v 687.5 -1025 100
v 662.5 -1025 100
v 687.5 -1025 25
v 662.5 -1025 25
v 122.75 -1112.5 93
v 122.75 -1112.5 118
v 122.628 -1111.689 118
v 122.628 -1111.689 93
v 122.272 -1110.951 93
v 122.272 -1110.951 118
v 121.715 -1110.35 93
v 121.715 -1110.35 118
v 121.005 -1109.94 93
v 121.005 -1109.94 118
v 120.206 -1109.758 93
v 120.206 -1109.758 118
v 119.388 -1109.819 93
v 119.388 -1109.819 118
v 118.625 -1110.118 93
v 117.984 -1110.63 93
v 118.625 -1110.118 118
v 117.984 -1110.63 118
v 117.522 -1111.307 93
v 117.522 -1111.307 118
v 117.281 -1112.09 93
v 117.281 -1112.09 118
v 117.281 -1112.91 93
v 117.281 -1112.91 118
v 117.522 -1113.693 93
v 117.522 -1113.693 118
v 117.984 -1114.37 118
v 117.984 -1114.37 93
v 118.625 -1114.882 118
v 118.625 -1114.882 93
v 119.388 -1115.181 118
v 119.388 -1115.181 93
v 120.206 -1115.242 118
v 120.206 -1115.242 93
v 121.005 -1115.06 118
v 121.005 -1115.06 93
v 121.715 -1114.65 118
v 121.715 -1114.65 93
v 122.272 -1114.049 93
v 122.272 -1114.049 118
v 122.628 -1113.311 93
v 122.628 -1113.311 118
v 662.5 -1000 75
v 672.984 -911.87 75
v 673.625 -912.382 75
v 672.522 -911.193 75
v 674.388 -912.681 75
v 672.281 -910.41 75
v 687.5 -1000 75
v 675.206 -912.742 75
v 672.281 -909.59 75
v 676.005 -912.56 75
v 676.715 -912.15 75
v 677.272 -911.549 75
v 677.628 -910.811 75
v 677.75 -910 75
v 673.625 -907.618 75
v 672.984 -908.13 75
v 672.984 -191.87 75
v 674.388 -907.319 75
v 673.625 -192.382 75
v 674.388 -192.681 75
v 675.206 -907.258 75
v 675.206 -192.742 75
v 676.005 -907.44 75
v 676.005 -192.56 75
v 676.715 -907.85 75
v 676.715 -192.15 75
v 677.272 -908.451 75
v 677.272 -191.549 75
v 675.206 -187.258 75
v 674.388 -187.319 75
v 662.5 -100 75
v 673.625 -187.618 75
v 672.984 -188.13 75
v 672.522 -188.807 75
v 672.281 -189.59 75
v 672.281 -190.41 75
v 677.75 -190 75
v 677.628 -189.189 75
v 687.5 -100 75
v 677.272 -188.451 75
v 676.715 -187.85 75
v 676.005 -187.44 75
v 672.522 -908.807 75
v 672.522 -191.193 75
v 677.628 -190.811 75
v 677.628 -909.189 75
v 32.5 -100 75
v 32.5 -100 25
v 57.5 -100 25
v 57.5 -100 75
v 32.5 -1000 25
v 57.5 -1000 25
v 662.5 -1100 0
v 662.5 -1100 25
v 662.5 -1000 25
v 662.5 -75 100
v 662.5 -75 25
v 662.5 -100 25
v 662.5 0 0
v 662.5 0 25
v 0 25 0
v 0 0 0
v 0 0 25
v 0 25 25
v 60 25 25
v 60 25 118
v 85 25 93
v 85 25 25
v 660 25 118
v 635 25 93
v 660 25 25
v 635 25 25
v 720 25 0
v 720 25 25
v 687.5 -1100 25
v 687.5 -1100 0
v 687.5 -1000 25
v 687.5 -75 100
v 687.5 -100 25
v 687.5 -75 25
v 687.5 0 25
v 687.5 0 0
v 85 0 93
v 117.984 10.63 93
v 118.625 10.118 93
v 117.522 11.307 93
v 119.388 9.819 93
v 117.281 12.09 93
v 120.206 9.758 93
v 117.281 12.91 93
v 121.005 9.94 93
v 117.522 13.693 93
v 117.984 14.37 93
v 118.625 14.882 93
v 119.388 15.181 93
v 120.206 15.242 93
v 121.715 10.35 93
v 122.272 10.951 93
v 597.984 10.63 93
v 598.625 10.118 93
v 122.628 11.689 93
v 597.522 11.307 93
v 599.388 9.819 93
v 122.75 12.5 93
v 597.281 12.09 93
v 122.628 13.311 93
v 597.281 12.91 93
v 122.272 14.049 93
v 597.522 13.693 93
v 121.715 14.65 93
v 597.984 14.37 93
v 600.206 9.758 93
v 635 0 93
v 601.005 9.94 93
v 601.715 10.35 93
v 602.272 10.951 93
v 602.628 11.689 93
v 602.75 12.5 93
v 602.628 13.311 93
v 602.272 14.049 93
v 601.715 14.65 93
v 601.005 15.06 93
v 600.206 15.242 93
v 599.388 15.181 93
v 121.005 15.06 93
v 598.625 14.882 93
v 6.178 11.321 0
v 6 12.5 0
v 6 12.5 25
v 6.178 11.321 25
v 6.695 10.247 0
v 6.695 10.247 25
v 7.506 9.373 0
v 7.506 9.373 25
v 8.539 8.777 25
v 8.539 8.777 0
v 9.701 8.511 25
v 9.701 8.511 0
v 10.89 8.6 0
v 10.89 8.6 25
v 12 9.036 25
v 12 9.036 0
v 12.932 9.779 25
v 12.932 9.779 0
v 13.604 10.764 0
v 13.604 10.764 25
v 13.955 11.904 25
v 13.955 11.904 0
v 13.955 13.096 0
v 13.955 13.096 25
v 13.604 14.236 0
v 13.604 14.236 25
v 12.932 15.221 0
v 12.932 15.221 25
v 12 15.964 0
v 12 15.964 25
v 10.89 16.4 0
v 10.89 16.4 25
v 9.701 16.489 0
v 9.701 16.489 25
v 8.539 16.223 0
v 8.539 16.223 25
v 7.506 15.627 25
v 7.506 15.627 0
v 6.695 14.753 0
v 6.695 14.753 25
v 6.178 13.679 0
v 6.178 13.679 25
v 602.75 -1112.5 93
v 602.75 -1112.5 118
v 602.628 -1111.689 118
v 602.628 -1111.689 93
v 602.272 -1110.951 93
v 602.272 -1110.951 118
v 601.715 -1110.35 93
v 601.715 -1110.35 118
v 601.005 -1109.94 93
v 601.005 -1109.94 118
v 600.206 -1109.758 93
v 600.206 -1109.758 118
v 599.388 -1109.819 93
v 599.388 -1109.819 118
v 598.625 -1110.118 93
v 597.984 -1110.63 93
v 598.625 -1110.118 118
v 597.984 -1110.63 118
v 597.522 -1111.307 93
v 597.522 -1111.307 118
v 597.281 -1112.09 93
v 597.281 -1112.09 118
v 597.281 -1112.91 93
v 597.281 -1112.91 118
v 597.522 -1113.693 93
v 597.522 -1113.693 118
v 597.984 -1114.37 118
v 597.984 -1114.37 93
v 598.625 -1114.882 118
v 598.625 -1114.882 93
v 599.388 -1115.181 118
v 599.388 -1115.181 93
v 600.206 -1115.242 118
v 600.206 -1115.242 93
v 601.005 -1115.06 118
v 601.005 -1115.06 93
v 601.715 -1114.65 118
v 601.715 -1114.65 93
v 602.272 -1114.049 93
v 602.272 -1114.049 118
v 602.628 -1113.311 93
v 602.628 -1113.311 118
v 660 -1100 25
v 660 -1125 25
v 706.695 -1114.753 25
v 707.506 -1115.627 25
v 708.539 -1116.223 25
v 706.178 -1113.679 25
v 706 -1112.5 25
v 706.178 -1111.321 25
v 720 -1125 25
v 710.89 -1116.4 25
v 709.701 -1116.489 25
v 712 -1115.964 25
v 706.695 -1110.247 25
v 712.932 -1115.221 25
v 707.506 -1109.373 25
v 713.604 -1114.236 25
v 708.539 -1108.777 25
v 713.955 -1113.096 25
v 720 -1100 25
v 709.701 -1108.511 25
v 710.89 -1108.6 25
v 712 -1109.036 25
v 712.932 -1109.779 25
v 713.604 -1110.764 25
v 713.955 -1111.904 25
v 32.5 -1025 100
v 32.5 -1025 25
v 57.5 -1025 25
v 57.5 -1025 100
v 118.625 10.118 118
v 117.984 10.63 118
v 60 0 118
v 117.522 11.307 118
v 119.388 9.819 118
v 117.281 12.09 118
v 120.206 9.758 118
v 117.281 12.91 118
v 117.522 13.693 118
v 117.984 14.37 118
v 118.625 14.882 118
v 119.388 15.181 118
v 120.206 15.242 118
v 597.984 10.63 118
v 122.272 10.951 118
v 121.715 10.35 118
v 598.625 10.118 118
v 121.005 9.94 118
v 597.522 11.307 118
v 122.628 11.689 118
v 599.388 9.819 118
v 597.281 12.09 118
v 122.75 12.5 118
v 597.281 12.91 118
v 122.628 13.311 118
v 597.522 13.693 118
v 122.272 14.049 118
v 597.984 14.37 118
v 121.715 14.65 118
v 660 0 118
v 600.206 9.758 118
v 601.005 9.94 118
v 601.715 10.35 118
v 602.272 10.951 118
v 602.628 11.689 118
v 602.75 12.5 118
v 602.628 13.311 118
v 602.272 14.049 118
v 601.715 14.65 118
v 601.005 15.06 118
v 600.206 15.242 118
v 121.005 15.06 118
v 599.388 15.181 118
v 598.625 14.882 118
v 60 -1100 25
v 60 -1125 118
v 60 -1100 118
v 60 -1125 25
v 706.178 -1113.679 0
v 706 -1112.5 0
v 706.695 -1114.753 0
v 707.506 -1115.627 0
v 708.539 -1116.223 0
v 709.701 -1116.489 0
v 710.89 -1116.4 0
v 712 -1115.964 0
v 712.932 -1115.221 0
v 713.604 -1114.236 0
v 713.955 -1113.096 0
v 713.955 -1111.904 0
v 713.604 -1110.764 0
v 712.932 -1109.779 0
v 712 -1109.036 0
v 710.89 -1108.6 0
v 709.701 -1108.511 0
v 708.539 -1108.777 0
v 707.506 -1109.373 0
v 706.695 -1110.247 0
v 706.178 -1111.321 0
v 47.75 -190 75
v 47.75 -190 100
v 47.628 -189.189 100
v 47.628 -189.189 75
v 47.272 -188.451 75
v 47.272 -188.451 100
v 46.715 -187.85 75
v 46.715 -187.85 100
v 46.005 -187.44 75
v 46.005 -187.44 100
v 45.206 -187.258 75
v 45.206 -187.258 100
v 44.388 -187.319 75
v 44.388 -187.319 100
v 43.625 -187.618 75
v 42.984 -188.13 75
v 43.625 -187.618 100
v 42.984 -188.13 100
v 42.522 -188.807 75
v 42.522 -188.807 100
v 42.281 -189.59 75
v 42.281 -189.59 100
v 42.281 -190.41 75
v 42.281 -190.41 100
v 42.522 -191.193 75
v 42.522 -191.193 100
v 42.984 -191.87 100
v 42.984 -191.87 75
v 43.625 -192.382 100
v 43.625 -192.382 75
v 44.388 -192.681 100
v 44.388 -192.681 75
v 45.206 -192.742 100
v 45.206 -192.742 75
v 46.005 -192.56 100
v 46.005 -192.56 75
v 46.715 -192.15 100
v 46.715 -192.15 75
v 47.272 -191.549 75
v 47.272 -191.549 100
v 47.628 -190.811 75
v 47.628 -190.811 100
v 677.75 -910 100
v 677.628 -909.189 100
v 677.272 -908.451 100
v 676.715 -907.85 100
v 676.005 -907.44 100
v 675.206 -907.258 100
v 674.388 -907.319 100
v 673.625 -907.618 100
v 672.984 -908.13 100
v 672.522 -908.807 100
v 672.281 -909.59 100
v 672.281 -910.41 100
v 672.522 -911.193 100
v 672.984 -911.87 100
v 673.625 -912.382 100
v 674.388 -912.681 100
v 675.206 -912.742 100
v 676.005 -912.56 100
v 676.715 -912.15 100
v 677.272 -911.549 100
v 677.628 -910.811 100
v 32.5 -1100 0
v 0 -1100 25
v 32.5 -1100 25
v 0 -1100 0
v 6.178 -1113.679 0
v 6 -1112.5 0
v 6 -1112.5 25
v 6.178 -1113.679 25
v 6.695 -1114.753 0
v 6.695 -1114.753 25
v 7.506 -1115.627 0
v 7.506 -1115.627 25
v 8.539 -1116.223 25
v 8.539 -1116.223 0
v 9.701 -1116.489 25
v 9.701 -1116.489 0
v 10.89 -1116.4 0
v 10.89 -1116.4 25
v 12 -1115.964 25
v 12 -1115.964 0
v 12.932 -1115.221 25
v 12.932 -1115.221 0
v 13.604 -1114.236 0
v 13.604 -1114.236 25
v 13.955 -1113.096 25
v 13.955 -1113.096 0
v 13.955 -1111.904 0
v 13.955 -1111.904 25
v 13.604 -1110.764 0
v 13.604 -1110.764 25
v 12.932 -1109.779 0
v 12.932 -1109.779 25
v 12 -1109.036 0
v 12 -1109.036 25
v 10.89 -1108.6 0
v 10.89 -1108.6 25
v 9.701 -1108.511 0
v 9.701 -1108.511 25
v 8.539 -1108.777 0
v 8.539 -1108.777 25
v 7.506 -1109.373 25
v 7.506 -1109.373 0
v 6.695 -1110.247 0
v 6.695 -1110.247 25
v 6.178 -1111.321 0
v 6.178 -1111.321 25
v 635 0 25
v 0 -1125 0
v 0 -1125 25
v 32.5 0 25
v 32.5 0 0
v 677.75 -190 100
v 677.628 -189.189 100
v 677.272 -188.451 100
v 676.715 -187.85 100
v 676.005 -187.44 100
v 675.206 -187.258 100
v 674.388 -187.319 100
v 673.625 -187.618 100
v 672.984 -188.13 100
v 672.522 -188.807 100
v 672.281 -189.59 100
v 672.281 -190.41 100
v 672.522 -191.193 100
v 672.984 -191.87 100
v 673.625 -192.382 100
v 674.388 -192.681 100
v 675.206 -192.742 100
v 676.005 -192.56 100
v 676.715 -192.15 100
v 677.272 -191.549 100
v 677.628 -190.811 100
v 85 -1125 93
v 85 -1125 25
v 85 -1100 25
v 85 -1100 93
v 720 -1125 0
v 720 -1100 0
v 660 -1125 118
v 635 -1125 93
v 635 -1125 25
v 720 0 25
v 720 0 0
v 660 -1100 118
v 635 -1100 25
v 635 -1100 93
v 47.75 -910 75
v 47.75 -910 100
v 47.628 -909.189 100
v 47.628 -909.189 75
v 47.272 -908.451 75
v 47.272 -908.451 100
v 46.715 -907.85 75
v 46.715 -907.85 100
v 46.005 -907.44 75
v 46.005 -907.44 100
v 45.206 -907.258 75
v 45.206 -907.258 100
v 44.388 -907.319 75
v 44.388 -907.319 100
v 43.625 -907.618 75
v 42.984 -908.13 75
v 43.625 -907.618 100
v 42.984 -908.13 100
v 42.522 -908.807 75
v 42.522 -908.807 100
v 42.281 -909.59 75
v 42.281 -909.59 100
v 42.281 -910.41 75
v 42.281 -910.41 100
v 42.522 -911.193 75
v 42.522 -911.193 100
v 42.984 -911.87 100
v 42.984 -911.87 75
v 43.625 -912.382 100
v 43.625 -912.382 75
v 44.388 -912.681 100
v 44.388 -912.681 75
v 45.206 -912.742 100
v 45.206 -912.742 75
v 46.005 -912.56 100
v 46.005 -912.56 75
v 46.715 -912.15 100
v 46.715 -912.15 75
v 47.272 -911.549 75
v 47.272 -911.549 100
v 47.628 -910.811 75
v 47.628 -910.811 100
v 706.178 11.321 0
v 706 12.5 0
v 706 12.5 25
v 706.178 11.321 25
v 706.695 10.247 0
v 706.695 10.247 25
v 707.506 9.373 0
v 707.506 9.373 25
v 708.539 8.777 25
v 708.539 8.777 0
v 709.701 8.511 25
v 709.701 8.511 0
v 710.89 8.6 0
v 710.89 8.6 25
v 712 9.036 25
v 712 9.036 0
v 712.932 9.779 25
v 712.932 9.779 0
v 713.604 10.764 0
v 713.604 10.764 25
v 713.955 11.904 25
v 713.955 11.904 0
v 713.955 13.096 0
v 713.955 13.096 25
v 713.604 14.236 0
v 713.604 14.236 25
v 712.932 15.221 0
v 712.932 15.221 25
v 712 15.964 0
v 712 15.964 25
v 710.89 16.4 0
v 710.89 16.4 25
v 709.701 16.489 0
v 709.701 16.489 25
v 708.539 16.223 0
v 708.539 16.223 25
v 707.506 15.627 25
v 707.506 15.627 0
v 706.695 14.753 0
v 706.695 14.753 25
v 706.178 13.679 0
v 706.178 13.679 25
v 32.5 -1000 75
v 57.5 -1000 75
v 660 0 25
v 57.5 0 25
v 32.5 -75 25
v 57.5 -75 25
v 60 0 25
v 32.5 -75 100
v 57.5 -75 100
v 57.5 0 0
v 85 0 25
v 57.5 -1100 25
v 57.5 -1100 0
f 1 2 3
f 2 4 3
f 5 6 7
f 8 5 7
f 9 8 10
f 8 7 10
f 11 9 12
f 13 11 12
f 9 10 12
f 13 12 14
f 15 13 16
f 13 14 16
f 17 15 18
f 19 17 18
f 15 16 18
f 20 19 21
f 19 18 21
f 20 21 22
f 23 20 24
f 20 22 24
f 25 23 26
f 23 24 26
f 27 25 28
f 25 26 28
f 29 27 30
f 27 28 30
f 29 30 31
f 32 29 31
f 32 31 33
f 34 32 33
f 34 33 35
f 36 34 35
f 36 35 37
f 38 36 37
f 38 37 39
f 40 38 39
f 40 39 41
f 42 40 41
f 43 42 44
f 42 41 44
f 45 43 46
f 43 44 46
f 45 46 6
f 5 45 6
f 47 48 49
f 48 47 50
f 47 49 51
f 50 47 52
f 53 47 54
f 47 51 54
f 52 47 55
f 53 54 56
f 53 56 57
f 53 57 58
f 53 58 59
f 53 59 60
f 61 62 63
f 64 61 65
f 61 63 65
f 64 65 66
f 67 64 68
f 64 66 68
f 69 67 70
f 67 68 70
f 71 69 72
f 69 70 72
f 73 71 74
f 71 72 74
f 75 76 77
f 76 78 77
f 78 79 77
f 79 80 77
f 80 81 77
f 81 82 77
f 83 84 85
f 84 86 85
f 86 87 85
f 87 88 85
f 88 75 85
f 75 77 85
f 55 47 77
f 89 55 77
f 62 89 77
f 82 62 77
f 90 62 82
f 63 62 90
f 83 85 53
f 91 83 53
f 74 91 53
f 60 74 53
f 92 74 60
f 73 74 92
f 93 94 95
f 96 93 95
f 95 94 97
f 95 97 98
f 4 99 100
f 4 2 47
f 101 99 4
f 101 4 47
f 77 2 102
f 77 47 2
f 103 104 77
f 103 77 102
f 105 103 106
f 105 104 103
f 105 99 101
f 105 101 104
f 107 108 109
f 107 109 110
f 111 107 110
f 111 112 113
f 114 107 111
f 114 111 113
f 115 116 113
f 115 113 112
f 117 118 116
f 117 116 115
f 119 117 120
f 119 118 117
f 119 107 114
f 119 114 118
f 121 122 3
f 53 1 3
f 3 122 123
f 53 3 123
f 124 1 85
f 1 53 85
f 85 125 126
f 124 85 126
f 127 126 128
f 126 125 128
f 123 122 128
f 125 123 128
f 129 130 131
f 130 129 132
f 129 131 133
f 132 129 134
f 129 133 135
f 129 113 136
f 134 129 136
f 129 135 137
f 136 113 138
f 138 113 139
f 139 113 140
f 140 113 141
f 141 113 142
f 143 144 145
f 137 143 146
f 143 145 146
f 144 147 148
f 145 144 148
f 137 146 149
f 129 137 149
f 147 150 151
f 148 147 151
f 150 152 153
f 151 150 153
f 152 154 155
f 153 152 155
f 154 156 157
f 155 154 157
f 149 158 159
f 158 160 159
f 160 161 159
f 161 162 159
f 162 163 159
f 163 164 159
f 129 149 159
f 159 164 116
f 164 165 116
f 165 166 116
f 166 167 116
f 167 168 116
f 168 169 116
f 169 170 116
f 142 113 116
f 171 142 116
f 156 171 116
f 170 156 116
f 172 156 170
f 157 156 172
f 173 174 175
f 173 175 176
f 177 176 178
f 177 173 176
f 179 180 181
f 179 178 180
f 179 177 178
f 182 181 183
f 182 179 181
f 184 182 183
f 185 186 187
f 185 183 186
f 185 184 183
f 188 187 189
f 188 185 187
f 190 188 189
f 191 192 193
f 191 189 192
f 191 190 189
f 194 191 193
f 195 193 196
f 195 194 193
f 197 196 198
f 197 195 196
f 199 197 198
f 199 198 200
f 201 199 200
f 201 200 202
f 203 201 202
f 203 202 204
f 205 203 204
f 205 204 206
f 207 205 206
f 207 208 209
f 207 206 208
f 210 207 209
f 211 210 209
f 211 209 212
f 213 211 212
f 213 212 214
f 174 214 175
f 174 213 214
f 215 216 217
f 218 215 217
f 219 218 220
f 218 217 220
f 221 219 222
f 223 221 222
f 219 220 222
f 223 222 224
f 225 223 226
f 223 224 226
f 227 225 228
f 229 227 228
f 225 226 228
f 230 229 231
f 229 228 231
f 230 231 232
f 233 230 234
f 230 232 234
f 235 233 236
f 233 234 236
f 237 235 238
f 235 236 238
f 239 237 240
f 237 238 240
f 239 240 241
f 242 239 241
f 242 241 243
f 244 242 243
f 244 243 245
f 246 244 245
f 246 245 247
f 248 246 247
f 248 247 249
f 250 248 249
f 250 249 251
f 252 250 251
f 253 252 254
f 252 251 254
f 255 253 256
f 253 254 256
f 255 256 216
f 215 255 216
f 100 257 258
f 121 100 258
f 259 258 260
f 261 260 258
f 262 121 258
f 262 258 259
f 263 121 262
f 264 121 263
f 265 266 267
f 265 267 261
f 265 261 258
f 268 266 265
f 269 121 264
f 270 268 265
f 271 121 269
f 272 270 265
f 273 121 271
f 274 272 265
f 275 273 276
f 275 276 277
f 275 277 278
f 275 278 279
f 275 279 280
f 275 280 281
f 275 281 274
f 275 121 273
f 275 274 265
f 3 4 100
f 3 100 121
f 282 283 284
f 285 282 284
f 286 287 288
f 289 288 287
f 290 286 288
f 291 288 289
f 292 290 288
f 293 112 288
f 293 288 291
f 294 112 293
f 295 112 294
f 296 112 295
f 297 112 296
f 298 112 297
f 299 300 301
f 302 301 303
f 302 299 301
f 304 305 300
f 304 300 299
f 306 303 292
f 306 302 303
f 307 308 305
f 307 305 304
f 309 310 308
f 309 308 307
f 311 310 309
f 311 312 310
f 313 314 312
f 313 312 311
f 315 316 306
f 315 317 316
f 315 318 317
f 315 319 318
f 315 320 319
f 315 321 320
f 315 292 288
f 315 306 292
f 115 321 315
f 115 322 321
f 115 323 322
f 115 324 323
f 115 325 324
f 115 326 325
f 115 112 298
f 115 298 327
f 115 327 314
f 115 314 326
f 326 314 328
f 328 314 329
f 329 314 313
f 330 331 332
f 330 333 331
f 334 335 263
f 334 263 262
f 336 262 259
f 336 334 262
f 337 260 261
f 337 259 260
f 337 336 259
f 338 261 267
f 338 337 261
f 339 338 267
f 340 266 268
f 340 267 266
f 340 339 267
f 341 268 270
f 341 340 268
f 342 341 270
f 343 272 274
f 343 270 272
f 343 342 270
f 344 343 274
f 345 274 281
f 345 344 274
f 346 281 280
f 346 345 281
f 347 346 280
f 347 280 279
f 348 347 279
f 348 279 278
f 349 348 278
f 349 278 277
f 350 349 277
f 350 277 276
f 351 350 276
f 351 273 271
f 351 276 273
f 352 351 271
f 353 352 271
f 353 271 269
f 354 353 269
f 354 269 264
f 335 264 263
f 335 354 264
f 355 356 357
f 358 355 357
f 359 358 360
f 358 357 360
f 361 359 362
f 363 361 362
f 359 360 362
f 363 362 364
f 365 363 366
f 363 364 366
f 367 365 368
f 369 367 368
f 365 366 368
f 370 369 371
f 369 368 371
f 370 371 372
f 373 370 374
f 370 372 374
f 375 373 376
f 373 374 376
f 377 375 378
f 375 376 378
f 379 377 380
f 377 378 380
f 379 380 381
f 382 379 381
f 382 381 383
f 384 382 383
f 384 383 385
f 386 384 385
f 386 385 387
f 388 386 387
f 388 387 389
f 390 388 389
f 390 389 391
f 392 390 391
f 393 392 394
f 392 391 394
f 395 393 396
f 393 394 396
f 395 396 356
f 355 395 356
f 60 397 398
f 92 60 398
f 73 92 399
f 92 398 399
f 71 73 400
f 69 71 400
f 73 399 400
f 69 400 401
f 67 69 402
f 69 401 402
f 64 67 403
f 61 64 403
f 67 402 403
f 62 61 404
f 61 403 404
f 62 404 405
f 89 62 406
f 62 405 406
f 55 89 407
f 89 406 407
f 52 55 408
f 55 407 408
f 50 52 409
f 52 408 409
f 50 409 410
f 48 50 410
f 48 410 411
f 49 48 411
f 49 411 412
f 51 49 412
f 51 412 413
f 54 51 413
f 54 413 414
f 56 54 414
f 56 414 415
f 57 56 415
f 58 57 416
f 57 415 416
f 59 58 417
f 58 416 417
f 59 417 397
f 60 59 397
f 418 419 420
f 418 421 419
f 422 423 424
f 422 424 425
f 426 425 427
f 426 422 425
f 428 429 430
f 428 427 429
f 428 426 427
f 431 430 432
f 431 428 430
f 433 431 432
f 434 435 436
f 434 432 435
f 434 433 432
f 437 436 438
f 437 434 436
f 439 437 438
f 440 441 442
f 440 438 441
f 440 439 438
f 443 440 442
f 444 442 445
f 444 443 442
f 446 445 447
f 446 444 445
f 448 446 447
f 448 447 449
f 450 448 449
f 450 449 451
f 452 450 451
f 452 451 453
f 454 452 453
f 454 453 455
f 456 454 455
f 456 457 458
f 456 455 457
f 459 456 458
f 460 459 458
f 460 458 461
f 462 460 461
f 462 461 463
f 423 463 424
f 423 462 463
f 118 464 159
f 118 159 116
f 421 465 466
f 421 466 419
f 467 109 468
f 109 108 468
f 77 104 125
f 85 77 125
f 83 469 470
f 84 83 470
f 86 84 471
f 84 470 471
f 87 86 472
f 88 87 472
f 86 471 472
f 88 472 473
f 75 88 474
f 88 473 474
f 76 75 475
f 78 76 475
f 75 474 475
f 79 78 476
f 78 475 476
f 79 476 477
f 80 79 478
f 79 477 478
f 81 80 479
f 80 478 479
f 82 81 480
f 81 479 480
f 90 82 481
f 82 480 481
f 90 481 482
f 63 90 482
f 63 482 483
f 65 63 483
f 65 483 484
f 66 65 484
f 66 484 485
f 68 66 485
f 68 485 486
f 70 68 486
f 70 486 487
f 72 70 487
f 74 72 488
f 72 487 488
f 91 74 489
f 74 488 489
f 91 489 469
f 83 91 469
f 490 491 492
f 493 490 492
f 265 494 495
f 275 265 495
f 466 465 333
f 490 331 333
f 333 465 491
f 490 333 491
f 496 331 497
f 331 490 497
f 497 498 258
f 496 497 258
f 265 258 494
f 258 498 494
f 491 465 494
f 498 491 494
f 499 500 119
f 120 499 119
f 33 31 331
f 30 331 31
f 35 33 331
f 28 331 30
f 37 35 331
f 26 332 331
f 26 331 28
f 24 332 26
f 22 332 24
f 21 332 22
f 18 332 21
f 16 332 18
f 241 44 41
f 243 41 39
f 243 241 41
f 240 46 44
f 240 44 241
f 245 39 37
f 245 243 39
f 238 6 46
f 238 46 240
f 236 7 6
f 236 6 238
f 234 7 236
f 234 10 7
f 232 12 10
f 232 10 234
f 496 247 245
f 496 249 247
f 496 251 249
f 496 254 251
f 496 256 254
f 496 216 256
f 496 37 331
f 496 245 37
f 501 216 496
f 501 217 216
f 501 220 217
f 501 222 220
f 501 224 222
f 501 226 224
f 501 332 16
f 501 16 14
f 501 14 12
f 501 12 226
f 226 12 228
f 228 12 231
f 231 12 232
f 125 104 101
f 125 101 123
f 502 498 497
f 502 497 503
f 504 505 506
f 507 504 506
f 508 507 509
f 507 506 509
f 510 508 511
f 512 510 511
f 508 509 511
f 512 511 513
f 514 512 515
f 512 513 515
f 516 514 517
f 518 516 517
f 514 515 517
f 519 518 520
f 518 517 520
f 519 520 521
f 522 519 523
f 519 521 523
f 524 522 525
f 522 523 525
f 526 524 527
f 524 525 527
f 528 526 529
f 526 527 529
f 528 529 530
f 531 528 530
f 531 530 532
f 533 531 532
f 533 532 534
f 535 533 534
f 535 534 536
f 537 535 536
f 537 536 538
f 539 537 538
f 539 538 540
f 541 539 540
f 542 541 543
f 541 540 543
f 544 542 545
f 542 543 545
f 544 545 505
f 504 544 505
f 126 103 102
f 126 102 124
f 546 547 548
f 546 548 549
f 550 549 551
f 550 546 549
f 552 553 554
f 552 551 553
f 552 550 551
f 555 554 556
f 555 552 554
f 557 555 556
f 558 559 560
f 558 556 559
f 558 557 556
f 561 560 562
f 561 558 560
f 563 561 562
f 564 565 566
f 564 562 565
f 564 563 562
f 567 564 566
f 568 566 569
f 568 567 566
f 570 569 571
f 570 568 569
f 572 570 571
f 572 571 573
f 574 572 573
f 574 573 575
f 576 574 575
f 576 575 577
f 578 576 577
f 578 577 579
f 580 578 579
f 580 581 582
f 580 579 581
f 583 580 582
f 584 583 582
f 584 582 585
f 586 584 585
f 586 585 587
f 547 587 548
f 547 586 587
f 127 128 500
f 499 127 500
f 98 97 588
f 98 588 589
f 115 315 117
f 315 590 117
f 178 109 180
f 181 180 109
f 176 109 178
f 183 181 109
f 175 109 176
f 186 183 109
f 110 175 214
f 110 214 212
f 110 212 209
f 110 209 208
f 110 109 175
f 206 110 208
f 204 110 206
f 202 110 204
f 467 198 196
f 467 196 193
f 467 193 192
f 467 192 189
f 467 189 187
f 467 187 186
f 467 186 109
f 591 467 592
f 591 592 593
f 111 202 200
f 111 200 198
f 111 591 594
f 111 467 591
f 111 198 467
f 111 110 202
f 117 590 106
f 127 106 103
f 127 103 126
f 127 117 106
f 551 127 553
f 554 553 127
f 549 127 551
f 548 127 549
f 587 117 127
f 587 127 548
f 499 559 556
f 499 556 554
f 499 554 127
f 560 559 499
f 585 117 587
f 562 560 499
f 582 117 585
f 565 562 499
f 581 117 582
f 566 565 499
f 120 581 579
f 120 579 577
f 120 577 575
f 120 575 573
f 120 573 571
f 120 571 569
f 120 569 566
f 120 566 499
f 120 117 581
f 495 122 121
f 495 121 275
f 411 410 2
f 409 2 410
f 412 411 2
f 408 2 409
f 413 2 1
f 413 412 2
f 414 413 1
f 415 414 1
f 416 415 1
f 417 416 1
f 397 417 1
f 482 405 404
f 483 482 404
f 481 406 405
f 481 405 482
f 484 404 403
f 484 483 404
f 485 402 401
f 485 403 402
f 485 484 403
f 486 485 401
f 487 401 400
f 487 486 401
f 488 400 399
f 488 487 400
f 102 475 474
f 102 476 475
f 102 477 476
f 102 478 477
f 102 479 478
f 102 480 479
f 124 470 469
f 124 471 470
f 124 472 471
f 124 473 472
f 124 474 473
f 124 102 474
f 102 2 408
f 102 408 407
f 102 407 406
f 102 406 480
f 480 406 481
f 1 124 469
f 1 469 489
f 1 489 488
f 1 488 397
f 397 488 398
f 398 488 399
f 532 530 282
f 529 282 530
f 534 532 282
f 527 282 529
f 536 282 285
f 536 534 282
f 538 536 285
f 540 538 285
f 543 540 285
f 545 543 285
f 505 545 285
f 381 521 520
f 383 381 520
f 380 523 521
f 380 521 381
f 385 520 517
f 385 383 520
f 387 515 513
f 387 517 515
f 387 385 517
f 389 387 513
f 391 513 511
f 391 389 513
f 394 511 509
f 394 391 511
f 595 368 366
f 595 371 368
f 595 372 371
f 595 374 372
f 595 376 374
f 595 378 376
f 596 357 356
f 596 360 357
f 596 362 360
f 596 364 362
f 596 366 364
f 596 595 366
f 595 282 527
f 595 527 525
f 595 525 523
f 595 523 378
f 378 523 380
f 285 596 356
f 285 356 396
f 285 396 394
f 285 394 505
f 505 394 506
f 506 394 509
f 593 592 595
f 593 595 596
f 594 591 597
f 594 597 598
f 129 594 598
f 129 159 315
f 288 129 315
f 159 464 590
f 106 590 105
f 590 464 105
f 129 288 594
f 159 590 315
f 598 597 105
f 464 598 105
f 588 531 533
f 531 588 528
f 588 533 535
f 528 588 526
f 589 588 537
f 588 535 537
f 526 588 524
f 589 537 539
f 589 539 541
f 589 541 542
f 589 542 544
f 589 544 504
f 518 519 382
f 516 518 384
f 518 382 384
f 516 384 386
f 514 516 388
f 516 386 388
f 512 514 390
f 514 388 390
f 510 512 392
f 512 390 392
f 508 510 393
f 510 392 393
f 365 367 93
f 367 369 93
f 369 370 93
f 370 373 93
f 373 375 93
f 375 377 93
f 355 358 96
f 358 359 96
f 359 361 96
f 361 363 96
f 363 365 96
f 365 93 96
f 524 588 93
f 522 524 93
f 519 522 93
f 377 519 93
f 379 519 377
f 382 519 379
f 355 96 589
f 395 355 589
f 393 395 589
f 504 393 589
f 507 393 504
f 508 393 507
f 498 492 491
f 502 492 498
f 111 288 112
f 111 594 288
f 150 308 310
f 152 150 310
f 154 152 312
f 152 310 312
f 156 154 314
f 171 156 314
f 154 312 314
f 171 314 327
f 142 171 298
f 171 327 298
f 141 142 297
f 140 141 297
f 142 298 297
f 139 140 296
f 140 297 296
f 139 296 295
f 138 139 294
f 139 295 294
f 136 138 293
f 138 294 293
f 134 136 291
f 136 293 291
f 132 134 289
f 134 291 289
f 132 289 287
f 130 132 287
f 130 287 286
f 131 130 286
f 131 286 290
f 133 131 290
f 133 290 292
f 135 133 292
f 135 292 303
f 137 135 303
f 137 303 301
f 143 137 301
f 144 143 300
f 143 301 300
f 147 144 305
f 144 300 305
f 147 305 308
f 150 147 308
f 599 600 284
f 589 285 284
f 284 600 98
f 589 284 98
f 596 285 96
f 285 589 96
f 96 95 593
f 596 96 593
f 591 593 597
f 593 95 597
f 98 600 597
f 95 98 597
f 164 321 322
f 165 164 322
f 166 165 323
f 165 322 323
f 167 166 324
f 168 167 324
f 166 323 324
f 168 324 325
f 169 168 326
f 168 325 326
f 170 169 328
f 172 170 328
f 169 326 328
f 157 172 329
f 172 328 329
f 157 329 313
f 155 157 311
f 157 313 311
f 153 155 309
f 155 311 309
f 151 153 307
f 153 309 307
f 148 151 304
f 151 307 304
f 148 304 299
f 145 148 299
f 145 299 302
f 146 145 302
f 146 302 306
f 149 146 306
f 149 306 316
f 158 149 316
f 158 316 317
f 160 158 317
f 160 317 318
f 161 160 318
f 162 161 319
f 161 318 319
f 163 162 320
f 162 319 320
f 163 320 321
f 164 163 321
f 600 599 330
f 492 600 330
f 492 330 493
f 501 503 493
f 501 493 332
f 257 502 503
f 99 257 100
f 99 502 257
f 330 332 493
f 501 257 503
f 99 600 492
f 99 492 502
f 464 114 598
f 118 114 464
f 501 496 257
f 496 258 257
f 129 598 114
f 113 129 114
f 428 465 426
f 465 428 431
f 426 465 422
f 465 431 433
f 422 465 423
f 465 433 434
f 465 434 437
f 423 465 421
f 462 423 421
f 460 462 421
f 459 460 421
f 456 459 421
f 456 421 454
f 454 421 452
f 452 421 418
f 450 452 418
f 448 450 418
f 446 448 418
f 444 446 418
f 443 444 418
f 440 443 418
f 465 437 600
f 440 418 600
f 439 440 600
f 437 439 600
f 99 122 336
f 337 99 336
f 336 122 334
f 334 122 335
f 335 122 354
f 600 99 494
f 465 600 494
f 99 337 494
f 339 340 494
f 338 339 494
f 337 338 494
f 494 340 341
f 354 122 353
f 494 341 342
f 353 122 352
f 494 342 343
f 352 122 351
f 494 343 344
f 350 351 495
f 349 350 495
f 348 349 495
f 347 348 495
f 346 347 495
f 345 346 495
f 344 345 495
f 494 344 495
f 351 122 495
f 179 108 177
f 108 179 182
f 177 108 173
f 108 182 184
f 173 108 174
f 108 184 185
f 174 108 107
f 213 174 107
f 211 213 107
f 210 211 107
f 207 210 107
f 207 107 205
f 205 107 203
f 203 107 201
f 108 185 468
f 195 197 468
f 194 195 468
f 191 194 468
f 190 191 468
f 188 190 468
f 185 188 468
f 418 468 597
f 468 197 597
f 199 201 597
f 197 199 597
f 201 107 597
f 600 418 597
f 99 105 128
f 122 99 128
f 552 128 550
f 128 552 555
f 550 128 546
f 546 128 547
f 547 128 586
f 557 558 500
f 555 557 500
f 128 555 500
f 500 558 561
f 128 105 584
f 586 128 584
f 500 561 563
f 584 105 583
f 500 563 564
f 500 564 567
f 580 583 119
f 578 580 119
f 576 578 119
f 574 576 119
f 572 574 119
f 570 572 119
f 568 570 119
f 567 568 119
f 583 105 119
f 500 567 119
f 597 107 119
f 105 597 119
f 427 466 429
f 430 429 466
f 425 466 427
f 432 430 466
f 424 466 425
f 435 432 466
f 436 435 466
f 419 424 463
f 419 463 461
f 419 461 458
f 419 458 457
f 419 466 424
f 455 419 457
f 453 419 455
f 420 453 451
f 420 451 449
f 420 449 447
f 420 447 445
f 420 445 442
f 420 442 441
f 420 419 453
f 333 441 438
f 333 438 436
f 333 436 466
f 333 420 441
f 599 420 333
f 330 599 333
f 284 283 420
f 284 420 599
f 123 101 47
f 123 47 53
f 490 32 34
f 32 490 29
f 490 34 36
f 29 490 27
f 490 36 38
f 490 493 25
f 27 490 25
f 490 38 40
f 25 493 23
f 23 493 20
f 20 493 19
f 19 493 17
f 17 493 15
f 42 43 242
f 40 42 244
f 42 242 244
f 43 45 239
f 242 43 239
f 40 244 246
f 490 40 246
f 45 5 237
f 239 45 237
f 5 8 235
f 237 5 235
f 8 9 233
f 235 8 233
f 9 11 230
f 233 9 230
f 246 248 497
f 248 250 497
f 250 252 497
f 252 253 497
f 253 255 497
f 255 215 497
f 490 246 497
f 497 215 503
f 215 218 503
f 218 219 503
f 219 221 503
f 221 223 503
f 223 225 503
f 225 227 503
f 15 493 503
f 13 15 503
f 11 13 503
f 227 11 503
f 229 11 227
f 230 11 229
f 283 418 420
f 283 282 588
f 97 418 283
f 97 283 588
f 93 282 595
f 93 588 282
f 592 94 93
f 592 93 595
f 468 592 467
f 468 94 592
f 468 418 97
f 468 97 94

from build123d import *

# Parameters (mm, degrees)
ESQUISSE1_W                  = 720
ESQUISSE1_H                  = 25
BOSS_EXTRU_1_DEPTH           = 25
BOSS_EXTRU_1_2_DEPTH         = 25
ENL_V_MAT_EXTRU_1_DEPTH      = 25
ENL_V_MAT_EXTRU_1_DEPTH_BACK = 100
ESQUISSE2_R                  = 4
ESQUISSE3_W                  = 25
ESQUISSE3_H                  = 25
BOSS_EXTRU_2_DEPTH           = 68
ESQUISSE4_W                  = 600
ESQUISSE4_H                  = 25
BOSS_EXTRU_3_DEPTH           = 25
ESQUISSE5_R                  = 2.75
ENL_V_MAT_EXTRU_2_DEPTH      = 25
ESQUISSE6_W                  = 25
ESQUISSE6_H                  = 1100
BOSS_EXTRU_4_DEPTH           = 25
ESQUISSE7_W                  = 25
ESQUISSE7_H                  = 25
BOSS_EXTRU_5_DEPTH           = 50
ESQUISSE8_W                  = 25
ESQUISSE8_H                  = 950
BOSS_EXTRU_6_DEPTH           = 25
ESQUISSE9_R                  = 2.75
ENL_V_MAT_EXTRU_3_DEPTH      = 25


with BuildPart() as part:
    # Esquisse1 → Boss.-Extru.1 (new body)
    with BuildSketch(Plane.XY):
        with Locations((360, 12.5)):
            Rectangle(ESQUISSE1_W, ESQUISSE1_H)
    extrude(amount=BOSS_EXTRU_1_DEPTH)


with BuildPart() as body_2:
    # Esquisse1 → Boss.-Extru.1 2 (new body)
    with BuildSketch(Plane.XY):
        with Locations((360, -1112.5)):
            Rectangle(ESQUISSE1_W, ESQUISSE1_H)
    extrude(amount=BOSS_EXTRU_1_2_DEPTH)


with BuildPart() as enl_v_mat_extru_1_tool:
    # Esquisse2 → Enlèv. mat.-Extru.1 (new, two sides: drawn at the far end of the back side and taken through both)
    with BuildSketch(Plane.XY.offset(25).offset(-ENL_V_MAT_EXTRU_1_DEPTH_BACK)):
        with Locations(Location((10, 12.5, 0), (0, 0, 180))):
            Circle(ESQUISSE2_R)
        with Locations(Location((710, 12.5, 0), (0, 0, 180))):
            Circle(ESQUISSE2_R)
        with Locations(Location((710, -1112.5, 0), (0, 0, 180))):
            Circle(ESQUISSE2_R)
        with Locations(Location((10, -1112.5, 0), (0, 0, 180))):
            Circle(ESQUISSE2_R)
    extrude(amount=ENL_V_MAT_EXTRU_1_DEPTH + ENL_V_MAT_EXTRU_1_DEPTH_BACK)


with BuildPart() as part_1:
    add(part.part)

    # Enlèv. mat.-Extru.1: cut by enl_v_mat_extru_1_tool
    add(enl_v_mat_extru_1_tool.part, mode=Mode.SUBTRACT)



with BuildPart() as body_2_1:
    add(body_2.part)

    # Enlèv. mat.-Extru.1: cut by enl_v_mat_extru_1_tool
    add(enl_v_mat_extru_1_tool.part, mode=Mode.SUBTRACT)


with BuildPart() as part_2:
    add(part_1.part)

    add(body_2_1.part)  # Boss.-Extru.2 merges body 2
    # Esquisse3 → Boss.-Extru.2 (add)
    with BuildSketch(Plane.XY.offset(25)):
        with Locations((72.5, 12.5)):
            Rectangle(ESQUISSE3_W, ESQUISSE3_H)
        with Locations((647.5, 12.5)):
            Rectangle(ESQUISSE3_W, ESQUISSE3_H)
        with Locations((72.5, -1112.5)):
            Rectangle(ESQUISSE3_W, ESQUISSE3_H)
        with Locations((647.5, -1112.5)):
            Rectangle(ESQUISSE3_W, ESQUISSE3_H)
    extrude(amount=BOSS_EXTRU_2_DEPTH)

    # Esquisse4 → Boss.-Extru.3 (add)
    with BuildSketch(Plane.XY.offset(93)):
        with Locations((360, 12.5)):
            Rectangle(ESQUISSE4_W, ESQUISSE4_H)
        with Locations((360, -1112.5)):
            Rectangle(ESQUISSE4_W, ESQUISSE4_H)
    extrude(amount=BOSS_EXTRU_3_DEPTH)

    # Esquisse5 → Enlèv. mat.-Extru.2 (cut)
    with BuildSketch(Plane.XY.offset(118)):
        with Locations((120, 12.5)):
            Circle(ESQUISSE5_R)
        with Locations((600, 12.5)):
            Circle(ESQUISSE5_R)
        with Locations((600, -1112.5)):
            Circle(ESQUISSE5_R)
        with Locations((120, -1112.5)):
            Circle(ESQUISSE5_R)
    extrude(amount=-ENL_V_MAT_EXTRU_2_DEPTH, mode=Mode.SUBTRACT)

    # Esquisse6 → Boss.-Extru.4 (add)
    with BuildSketch(Plane(origin=(0, 0, 0), x_dir=(-1, 0, 0), z_dir=(0, 0, -1))):
        with Locations((-675, -550)):
            Rectangle(ESQUISSE6_W, ESQUISSE6_H)
        with Locations((-45, -550)):
            Rectangle(ESQUISSE6_W, ESQUISSE6_H)
    extrude(amount=-BOSS_EXTRU_4_DEPTH)

    # Esquisse7 → Boss.-Extru.5 (add)
    with BuildSketch(Plane.XY.offset(25)):
        with Locations((45, -1012.5)):
            Rectangle(ESQUISSE7_W, ESQUISSE7_H)
        with Locations((45, -87.5)):
            Rectangle(ESQUISSE7_W, ESQUISSE7_H)
        with Locations((675, -87.5)):
            Rectangle(ESQUISSE7_W, ESQUISSE7_H)
        with Locations((675, -1012.5)):
            Rectangle(ESQUISSE7_W, ESQUISSE7_H)
    extrude(amount=BOSS_EXTRU_5_DEPTH)

    # Esquisse8 → Boss.-Extru.6 (add)
    with BuildSketch(Plane.XY.offset(75)):
        with Locations((675, -550)):
            Rectangle(ESQUISSE8_W, ESQUISSE8_H)
        with Locations((45, -550)):
            Rectangle(ESQUISSE8_W, ESQUISSE8_H)
    extrude(amount=BOSS_EXTRU_6_DEPTH)

    # Esquisse9 → Enlèv. mat.-Extru.3 (cut)
    with BuildSketch(Plane.XY.offset(100)):
        with Locations((675, -910)):
            Circle(ESQUISSE9_R)
        with Locations((45, -910)):
            Circle(ESQUISSE9_R)
        with Locations((675, -190)):
            Circle(ESQUISSE9_R)
        with Locations((45, -190)):
            Circle(ESQUISSE9_R)
    extrude(amount=-ENL_V_MAT_EXTRU_3_DEPTH, mode=Mode.SUBTRACT)


solid = part_2.part
